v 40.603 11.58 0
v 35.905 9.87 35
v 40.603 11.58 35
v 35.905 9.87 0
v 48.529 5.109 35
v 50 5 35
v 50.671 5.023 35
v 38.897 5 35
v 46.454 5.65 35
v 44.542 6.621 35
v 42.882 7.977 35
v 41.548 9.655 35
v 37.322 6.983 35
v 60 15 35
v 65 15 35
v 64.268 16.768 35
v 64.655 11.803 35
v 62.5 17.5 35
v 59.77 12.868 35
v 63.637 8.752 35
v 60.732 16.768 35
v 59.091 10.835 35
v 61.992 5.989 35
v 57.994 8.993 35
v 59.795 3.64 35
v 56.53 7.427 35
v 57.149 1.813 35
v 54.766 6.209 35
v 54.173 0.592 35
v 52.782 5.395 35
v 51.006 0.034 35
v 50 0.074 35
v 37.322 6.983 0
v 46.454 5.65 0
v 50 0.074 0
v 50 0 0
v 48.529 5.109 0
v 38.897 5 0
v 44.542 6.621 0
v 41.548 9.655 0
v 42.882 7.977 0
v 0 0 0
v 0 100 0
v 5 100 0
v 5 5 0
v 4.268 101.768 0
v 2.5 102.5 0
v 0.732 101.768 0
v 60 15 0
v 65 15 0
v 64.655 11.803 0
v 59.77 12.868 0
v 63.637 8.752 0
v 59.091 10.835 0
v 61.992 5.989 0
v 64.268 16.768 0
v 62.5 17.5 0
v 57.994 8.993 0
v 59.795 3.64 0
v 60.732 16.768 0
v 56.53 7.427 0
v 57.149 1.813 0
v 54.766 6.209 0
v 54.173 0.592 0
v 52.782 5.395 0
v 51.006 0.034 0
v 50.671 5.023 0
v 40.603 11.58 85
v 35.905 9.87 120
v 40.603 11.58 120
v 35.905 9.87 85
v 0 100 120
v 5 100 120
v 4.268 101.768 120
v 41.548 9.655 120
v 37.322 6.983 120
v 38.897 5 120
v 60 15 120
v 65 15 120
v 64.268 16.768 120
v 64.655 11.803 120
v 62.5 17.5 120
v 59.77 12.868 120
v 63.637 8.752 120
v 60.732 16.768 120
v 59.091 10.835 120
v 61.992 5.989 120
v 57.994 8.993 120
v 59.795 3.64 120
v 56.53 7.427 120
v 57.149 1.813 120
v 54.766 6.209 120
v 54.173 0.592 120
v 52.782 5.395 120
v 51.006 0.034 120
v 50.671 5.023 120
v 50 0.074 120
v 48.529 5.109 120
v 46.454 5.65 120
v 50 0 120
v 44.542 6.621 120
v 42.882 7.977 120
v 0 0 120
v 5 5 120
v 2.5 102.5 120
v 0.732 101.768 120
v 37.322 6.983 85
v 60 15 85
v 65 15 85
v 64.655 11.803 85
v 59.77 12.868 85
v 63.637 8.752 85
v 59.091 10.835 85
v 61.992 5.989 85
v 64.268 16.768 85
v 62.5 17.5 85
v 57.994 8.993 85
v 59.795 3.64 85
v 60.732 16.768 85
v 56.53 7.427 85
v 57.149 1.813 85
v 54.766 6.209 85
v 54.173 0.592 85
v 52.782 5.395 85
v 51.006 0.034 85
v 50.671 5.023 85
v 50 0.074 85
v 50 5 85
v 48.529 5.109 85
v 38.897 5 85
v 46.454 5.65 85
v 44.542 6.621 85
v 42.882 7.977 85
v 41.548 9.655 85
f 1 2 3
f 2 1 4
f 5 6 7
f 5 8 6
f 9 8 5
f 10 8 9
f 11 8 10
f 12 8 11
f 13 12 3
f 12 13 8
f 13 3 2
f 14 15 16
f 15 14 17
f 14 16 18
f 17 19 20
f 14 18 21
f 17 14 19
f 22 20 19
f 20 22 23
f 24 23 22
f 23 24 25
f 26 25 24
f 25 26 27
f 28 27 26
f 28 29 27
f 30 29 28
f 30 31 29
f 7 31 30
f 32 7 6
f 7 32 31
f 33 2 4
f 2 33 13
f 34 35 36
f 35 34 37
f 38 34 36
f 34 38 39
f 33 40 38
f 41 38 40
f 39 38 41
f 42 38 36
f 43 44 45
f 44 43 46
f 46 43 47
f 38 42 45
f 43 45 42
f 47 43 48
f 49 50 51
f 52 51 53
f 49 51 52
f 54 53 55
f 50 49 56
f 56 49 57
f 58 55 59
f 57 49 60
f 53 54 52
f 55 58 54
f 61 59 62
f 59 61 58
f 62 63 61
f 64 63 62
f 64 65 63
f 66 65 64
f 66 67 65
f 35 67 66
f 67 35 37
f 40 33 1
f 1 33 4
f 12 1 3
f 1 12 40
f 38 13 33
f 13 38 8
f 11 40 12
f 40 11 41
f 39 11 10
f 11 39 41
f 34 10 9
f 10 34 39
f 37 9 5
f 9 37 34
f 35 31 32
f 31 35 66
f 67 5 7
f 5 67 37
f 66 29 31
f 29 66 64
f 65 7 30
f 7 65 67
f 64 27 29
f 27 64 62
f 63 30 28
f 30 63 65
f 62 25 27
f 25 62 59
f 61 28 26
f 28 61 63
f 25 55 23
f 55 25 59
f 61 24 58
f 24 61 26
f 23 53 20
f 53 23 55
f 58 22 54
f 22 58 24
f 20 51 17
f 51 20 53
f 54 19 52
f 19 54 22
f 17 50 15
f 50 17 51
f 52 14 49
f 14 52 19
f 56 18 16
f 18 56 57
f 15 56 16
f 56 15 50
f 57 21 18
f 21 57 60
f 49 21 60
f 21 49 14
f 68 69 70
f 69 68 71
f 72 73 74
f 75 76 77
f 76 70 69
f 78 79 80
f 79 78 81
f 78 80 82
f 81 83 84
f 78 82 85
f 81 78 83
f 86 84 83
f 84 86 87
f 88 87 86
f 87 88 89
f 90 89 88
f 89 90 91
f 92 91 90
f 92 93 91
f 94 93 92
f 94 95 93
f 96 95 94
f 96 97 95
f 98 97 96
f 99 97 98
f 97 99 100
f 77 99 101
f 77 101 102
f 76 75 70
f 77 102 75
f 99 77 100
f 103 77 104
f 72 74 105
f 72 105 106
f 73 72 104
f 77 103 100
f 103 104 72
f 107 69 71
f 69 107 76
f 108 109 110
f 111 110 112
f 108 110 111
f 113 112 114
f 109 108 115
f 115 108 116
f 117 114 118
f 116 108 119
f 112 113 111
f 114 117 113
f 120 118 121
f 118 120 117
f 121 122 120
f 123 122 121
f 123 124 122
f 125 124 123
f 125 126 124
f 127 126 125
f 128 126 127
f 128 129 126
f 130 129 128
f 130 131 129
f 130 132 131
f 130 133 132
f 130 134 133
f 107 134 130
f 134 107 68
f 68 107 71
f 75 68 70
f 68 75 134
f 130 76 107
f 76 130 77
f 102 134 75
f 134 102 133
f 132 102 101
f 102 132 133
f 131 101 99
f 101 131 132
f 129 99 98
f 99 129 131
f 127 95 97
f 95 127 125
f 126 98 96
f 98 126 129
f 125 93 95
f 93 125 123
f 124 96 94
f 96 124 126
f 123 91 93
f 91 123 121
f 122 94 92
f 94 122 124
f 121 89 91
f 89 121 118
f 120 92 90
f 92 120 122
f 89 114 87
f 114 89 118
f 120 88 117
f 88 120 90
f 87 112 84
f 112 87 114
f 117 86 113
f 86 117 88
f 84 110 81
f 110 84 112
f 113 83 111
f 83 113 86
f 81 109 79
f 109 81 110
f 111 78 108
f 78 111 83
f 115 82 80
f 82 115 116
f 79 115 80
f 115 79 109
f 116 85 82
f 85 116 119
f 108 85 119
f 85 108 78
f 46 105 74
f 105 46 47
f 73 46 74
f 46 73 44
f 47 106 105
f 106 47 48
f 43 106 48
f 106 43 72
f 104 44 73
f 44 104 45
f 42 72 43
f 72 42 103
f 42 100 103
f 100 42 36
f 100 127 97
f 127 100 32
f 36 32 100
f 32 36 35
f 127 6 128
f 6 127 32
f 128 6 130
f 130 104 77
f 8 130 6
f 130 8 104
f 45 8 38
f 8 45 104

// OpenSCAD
function kindle_width() = 120;
function kindle_height() = 170;
function kindle_thickness_with_case() = 14;
function kindle_bottom_center_cutout_width() = 50;

function stand_wall_thickness() = 5;
function stand_wall_thickness() = 5;

function stand_foot_depth() = 50;
function stand_foot_arch_a() = 160;
function stand_foot_arch_r() = 10;
function stand_height() = 100;

module arch(r = stand_foot_arch_r(), t = stand_wall_thickness(), h = kindle_width(), a = stand_foot_arch_a()) {
       rotate_extrude(angle = a)
            translate([r, 0, 0])
                square([t, h]);
}

module stand_foot_arch_half() {
    half_section_width = (kindle_width() - kindle_bottom_center_cutout_width()) / 2;
    offset_x = stand_foot_depth();
    offset_y = stand_foot_arch_r() + stand_wall_thickness();

    round_end_offset_x = offset_x + stand_foot_arch_r() + stand_wall_thickness() / 2;
    union() {
        translate([offset_x, offset_y, 0]) rotate([0, 0, - stand_foot_arch_a()]) arch(h = half_section_width);
        translate([round_end_offset_x, offset_y, 0])
            cylinder(d = stand_wall_thickness(), h = half_section_width);
    }
}
module stand_foot_arch() {
    half_section_width = (kindle_width() - kindle_bottom_center_cutout_width()) / 2;

    right_side_offset_z = kindle_width() - half_section_width;

    stand_foot_arch_half();
    translate([0, 0, right_side_offset_z]) stand_foot_arch_half();
}

module round_top() {
    translate([stand_wall_thickness() / 2, stand_height(), 0])
        cylinder(d = stand_wall_thickness(), h = kindle_width());

}
module kindle_simple_stand() {
    union() {
        round_top();
        cube([stand_wall_thickness(), stand_height(), kindle_width()]);
        cube([stand_foot_depth(), stand_wall_thickness(), kindle_width()]);
        stand_foot_arch();
    }
}

kindle_simple_stand();
